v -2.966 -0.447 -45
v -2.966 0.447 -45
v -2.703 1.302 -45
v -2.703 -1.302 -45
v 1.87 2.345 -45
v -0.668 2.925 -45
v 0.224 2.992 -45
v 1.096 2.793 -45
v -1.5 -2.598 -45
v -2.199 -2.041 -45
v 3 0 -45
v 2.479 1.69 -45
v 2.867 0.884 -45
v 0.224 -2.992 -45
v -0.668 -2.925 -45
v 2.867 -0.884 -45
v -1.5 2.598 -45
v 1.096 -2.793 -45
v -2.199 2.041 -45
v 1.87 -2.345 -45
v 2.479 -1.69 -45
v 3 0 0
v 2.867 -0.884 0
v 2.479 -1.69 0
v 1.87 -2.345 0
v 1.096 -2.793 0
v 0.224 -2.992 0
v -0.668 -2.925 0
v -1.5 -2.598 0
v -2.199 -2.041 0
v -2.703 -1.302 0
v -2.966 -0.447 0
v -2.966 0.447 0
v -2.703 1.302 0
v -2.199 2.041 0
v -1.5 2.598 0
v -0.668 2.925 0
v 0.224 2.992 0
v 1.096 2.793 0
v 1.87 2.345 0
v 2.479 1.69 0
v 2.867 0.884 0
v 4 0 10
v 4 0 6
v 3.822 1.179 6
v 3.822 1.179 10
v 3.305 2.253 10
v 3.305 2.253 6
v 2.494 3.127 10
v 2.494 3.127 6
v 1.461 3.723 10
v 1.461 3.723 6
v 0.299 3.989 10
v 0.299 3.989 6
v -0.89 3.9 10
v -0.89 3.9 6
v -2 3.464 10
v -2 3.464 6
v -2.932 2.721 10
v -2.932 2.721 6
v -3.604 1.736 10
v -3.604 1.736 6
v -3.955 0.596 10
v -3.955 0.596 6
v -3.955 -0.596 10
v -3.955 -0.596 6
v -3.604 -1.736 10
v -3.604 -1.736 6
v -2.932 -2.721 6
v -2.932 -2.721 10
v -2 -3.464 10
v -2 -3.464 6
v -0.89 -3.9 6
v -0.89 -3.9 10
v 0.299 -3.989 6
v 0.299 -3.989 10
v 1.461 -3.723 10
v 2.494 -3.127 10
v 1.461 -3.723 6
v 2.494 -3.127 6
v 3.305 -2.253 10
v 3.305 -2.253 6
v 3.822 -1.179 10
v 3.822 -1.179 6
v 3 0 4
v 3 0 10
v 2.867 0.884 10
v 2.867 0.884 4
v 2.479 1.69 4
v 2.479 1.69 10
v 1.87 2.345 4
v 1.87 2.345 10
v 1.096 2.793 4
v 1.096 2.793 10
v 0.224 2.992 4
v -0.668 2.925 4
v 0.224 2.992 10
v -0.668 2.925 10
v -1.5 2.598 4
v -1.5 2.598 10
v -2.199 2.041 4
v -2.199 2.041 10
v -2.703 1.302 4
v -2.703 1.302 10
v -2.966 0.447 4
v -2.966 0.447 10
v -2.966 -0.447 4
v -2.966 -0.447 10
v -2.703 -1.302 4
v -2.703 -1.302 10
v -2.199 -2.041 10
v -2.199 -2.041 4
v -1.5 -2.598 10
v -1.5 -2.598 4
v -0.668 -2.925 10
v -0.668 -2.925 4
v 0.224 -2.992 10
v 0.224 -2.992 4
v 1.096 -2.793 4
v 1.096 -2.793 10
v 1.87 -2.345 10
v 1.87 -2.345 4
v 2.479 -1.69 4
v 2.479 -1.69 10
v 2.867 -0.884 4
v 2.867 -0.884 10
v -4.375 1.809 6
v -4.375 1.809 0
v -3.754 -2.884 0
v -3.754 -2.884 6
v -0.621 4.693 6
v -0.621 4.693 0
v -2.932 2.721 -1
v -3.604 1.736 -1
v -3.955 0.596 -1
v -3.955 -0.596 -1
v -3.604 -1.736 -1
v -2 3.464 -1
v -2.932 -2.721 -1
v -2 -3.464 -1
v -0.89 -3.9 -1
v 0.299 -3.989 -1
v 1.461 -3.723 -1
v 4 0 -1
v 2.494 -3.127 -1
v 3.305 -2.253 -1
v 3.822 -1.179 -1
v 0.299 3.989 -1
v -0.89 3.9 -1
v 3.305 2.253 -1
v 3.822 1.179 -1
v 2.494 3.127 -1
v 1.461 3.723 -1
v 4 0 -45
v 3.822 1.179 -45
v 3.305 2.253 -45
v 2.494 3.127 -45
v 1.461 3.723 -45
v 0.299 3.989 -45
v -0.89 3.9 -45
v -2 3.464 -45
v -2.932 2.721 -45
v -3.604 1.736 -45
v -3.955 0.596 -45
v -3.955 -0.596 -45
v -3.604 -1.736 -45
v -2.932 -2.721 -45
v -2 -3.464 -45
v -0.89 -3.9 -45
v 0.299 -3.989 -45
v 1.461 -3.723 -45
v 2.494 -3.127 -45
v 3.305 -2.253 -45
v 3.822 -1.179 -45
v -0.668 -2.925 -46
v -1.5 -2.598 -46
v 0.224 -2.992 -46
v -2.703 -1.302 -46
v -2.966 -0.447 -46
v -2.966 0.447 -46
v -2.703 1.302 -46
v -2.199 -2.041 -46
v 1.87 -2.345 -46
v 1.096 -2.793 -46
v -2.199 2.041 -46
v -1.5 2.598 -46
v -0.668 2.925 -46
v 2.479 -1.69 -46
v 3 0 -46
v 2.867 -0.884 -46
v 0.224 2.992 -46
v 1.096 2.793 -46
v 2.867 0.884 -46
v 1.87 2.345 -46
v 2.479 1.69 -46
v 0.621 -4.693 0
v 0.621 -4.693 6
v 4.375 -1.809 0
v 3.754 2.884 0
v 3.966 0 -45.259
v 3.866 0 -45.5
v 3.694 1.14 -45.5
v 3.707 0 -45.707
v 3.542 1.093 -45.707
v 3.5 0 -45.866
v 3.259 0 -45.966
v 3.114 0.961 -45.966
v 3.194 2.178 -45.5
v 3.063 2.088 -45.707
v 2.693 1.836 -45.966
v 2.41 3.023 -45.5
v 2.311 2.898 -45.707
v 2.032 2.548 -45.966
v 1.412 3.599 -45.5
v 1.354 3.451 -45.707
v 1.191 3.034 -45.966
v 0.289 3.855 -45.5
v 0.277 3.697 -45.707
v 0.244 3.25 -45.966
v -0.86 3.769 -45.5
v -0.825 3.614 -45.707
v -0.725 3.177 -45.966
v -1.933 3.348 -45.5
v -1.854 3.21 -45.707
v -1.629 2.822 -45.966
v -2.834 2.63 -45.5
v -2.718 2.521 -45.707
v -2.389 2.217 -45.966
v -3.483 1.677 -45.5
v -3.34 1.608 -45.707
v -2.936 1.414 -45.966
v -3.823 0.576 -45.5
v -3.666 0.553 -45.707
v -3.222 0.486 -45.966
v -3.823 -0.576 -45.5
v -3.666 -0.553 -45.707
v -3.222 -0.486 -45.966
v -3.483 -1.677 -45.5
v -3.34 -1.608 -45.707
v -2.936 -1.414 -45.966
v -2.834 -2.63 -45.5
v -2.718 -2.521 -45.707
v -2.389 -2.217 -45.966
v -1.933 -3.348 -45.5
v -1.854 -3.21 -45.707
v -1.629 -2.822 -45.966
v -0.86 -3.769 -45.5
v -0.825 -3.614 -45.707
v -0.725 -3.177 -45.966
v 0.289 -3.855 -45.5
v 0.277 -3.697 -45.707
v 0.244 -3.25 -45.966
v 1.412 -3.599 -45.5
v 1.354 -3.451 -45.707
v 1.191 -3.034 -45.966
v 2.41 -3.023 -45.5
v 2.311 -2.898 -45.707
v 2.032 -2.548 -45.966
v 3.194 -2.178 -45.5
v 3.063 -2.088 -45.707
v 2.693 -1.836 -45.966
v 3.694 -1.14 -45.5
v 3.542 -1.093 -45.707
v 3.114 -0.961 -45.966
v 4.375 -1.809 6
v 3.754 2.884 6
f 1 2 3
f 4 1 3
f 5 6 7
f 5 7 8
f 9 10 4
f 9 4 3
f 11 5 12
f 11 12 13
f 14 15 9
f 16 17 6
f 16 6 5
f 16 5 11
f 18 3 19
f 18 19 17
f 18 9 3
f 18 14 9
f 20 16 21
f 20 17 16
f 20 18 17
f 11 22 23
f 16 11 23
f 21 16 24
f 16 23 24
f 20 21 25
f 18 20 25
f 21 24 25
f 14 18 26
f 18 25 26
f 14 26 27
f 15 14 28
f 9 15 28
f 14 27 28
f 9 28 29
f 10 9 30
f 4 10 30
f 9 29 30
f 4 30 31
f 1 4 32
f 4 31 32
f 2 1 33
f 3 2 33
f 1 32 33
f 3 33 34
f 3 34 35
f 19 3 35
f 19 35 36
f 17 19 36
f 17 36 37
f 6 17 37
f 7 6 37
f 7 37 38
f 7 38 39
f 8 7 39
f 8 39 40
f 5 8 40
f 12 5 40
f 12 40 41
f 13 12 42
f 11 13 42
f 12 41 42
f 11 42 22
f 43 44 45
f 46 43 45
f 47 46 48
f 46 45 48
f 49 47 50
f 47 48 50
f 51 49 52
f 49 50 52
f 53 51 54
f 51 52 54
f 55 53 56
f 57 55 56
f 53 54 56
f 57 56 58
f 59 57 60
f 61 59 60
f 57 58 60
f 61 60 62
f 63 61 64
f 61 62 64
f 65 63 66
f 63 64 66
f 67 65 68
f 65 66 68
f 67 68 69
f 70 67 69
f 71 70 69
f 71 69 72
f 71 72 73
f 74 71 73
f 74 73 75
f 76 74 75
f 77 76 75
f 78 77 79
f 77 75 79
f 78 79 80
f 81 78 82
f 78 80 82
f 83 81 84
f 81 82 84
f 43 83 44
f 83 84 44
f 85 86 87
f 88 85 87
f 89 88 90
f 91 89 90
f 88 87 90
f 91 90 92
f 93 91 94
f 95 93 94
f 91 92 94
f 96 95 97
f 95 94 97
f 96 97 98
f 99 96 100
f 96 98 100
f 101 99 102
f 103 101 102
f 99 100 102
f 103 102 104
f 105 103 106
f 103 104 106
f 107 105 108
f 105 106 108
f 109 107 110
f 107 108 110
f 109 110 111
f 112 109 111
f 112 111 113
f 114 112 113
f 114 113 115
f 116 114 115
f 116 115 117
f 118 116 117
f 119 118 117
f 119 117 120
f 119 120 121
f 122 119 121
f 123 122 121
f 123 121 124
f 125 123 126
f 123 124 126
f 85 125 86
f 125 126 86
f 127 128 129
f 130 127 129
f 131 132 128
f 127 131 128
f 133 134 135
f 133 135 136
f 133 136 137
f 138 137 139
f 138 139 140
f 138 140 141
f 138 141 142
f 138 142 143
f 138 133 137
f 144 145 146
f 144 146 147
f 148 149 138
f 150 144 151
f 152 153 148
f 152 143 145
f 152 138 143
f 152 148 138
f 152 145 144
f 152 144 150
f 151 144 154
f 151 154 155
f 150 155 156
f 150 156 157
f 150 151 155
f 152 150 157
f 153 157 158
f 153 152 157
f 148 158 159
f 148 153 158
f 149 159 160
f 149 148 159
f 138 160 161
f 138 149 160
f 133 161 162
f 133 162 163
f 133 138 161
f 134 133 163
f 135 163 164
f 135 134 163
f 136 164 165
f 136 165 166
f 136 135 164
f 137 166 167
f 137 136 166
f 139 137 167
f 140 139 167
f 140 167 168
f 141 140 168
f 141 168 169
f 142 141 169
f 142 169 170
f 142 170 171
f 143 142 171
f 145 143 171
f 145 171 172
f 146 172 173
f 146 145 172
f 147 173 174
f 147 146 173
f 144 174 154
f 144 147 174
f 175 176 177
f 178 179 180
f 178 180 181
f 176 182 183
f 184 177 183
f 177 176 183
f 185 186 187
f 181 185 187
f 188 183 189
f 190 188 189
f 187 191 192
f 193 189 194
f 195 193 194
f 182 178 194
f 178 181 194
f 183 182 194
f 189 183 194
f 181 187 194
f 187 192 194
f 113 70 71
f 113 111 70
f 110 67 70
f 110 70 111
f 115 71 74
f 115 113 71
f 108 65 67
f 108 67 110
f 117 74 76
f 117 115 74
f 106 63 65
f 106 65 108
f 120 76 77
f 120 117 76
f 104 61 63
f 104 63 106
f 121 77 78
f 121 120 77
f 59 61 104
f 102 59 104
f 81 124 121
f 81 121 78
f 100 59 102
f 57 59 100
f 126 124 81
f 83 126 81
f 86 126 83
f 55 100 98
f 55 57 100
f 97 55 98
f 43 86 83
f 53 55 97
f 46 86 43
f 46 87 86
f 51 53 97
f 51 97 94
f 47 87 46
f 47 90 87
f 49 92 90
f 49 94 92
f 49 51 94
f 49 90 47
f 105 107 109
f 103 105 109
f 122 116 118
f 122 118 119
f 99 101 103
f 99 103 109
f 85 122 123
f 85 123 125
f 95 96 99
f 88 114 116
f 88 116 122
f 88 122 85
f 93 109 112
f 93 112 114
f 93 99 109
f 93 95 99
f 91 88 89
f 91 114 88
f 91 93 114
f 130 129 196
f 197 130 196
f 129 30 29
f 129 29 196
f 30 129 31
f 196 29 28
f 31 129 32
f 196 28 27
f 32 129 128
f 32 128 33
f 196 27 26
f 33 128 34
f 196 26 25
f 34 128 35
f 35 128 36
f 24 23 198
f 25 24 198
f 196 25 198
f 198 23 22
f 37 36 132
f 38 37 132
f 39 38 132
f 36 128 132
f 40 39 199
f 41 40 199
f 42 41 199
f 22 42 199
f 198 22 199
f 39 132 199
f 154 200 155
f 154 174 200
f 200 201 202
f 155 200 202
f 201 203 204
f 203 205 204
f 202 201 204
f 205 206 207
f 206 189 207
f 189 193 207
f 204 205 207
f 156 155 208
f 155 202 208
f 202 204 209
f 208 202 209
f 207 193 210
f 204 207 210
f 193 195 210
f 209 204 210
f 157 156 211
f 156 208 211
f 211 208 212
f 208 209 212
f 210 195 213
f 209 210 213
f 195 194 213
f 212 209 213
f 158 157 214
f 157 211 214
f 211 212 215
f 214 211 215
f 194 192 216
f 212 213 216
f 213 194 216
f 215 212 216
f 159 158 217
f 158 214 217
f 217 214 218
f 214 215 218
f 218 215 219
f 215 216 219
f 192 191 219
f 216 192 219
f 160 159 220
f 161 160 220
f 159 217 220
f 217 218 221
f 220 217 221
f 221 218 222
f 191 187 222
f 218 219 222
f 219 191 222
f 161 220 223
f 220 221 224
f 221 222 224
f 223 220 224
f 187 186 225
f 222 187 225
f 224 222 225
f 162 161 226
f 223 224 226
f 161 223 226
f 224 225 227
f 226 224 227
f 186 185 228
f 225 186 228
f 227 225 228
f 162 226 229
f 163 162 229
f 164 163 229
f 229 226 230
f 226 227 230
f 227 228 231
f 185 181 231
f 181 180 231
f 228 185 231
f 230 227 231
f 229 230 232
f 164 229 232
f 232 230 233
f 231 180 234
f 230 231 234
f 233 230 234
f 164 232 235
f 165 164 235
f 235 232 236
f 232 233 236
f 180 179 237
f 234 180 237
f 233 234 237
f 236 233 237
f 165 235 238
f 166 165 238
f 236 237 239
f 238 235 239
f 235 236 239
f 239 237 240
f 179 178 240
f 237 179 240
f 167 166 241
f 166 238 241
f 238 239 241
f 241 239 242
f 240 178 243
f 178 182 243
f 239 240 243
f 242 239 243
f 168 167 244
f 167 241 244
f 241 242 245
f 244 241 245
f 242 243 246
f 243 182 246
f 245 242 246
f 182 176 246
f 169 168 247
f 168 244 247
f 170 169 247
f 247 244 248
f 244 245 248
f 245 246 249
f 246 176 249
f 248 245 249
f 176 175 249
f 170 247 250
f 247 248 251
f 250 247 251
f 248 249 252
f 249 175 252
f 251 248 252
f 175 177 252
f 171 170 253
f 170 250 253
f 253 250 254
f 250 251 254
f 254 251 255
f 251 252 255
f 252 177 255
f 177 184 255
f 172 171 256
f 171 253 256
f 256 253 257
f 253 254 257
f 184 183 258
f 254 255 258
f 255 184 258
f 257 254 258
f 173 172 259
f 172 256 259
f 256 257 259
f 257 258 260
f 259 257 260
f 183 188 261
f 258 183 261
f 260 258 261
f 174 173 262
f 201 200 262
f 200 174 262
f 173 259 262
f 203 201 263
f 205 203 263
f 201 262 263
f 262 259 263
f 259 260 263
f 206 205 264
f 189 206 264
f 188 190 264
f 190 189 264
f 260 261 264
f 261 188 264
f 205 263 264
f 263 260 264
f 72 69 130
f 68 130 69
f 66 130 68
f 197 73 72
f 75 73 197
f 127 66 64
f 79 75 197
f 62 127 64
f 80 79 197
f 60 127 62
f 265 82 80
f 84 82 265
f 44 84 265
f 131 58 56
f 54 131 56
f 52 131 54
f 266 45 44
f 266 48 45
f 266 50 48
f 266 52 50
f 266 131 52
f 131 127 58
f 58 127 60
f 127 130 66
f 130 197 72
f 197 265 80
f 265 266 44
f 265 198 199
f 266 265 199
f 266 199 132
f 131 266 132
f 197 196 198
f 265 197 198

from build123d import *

# Parameters (mm, degrees)
F1_DEPTH  = 6
F2_R      = 3
F3_DEPTH  = 45
F4_R      = 4
F5_DEPTH  = 4
F6_R      = 3
F7_DEPTH  = 6
F9_R      = 4
F10_DEPTH = 45
F11_R     = 1


with BuildPart() as f1:
    # F0 (on Top) → F1 (new body)
    with BuildSketch(Plane.XY):
        Polygon((3.7543514148, 2.8841253072), (-0.6205500764, 4.6934263535), (-4.3749014911, 1.8093010463), (-3.7543514148, -2.8841253072), (0.6205500764, -4.6934263535), (4.3749014911, -1.8093010463), align=None)
    extrude(amount=F1_DEPTH)

    # F2 (on face) → F3 (join)
    with BuildSketch(Plane(origin=(0, 0, 0), x_dir=(1, 0, 0), z_dir=(0, 0, -1))):
        Circle(F2_R)
    extrude(amount=F3_DEPTH)

    # F4 (on face) → F5 (join)
    with BuildSketch(Plane.XY.offset(6)):
        Circle(F4_R)
    extrude(amount=F5_DEPTH)

    # F6 (on face) → F7 (cut)
    with BuildSketch(Plane.XY.offset(10)):
        Circle(F6_R)
    extrude(amount=-F7_DEPTH, mode=Mode.SUBTRACT)


with BuildPart() as f10:
    # F9 (on offset) → F10 (new body)
    with BuildSketch(Plane.XY.offset(-1)):
        Circle(F9_R)
    extrude(amount=-F10_DEPTH)

    # F11
    f11_edges = [f10.edges().sort_by_distance(p)[0] for p in [
        (-4, 0, -46),
    ]]
    fillet(f11_edges, radius=F11_R)


solid = Compound([f1.part, f10.part])
